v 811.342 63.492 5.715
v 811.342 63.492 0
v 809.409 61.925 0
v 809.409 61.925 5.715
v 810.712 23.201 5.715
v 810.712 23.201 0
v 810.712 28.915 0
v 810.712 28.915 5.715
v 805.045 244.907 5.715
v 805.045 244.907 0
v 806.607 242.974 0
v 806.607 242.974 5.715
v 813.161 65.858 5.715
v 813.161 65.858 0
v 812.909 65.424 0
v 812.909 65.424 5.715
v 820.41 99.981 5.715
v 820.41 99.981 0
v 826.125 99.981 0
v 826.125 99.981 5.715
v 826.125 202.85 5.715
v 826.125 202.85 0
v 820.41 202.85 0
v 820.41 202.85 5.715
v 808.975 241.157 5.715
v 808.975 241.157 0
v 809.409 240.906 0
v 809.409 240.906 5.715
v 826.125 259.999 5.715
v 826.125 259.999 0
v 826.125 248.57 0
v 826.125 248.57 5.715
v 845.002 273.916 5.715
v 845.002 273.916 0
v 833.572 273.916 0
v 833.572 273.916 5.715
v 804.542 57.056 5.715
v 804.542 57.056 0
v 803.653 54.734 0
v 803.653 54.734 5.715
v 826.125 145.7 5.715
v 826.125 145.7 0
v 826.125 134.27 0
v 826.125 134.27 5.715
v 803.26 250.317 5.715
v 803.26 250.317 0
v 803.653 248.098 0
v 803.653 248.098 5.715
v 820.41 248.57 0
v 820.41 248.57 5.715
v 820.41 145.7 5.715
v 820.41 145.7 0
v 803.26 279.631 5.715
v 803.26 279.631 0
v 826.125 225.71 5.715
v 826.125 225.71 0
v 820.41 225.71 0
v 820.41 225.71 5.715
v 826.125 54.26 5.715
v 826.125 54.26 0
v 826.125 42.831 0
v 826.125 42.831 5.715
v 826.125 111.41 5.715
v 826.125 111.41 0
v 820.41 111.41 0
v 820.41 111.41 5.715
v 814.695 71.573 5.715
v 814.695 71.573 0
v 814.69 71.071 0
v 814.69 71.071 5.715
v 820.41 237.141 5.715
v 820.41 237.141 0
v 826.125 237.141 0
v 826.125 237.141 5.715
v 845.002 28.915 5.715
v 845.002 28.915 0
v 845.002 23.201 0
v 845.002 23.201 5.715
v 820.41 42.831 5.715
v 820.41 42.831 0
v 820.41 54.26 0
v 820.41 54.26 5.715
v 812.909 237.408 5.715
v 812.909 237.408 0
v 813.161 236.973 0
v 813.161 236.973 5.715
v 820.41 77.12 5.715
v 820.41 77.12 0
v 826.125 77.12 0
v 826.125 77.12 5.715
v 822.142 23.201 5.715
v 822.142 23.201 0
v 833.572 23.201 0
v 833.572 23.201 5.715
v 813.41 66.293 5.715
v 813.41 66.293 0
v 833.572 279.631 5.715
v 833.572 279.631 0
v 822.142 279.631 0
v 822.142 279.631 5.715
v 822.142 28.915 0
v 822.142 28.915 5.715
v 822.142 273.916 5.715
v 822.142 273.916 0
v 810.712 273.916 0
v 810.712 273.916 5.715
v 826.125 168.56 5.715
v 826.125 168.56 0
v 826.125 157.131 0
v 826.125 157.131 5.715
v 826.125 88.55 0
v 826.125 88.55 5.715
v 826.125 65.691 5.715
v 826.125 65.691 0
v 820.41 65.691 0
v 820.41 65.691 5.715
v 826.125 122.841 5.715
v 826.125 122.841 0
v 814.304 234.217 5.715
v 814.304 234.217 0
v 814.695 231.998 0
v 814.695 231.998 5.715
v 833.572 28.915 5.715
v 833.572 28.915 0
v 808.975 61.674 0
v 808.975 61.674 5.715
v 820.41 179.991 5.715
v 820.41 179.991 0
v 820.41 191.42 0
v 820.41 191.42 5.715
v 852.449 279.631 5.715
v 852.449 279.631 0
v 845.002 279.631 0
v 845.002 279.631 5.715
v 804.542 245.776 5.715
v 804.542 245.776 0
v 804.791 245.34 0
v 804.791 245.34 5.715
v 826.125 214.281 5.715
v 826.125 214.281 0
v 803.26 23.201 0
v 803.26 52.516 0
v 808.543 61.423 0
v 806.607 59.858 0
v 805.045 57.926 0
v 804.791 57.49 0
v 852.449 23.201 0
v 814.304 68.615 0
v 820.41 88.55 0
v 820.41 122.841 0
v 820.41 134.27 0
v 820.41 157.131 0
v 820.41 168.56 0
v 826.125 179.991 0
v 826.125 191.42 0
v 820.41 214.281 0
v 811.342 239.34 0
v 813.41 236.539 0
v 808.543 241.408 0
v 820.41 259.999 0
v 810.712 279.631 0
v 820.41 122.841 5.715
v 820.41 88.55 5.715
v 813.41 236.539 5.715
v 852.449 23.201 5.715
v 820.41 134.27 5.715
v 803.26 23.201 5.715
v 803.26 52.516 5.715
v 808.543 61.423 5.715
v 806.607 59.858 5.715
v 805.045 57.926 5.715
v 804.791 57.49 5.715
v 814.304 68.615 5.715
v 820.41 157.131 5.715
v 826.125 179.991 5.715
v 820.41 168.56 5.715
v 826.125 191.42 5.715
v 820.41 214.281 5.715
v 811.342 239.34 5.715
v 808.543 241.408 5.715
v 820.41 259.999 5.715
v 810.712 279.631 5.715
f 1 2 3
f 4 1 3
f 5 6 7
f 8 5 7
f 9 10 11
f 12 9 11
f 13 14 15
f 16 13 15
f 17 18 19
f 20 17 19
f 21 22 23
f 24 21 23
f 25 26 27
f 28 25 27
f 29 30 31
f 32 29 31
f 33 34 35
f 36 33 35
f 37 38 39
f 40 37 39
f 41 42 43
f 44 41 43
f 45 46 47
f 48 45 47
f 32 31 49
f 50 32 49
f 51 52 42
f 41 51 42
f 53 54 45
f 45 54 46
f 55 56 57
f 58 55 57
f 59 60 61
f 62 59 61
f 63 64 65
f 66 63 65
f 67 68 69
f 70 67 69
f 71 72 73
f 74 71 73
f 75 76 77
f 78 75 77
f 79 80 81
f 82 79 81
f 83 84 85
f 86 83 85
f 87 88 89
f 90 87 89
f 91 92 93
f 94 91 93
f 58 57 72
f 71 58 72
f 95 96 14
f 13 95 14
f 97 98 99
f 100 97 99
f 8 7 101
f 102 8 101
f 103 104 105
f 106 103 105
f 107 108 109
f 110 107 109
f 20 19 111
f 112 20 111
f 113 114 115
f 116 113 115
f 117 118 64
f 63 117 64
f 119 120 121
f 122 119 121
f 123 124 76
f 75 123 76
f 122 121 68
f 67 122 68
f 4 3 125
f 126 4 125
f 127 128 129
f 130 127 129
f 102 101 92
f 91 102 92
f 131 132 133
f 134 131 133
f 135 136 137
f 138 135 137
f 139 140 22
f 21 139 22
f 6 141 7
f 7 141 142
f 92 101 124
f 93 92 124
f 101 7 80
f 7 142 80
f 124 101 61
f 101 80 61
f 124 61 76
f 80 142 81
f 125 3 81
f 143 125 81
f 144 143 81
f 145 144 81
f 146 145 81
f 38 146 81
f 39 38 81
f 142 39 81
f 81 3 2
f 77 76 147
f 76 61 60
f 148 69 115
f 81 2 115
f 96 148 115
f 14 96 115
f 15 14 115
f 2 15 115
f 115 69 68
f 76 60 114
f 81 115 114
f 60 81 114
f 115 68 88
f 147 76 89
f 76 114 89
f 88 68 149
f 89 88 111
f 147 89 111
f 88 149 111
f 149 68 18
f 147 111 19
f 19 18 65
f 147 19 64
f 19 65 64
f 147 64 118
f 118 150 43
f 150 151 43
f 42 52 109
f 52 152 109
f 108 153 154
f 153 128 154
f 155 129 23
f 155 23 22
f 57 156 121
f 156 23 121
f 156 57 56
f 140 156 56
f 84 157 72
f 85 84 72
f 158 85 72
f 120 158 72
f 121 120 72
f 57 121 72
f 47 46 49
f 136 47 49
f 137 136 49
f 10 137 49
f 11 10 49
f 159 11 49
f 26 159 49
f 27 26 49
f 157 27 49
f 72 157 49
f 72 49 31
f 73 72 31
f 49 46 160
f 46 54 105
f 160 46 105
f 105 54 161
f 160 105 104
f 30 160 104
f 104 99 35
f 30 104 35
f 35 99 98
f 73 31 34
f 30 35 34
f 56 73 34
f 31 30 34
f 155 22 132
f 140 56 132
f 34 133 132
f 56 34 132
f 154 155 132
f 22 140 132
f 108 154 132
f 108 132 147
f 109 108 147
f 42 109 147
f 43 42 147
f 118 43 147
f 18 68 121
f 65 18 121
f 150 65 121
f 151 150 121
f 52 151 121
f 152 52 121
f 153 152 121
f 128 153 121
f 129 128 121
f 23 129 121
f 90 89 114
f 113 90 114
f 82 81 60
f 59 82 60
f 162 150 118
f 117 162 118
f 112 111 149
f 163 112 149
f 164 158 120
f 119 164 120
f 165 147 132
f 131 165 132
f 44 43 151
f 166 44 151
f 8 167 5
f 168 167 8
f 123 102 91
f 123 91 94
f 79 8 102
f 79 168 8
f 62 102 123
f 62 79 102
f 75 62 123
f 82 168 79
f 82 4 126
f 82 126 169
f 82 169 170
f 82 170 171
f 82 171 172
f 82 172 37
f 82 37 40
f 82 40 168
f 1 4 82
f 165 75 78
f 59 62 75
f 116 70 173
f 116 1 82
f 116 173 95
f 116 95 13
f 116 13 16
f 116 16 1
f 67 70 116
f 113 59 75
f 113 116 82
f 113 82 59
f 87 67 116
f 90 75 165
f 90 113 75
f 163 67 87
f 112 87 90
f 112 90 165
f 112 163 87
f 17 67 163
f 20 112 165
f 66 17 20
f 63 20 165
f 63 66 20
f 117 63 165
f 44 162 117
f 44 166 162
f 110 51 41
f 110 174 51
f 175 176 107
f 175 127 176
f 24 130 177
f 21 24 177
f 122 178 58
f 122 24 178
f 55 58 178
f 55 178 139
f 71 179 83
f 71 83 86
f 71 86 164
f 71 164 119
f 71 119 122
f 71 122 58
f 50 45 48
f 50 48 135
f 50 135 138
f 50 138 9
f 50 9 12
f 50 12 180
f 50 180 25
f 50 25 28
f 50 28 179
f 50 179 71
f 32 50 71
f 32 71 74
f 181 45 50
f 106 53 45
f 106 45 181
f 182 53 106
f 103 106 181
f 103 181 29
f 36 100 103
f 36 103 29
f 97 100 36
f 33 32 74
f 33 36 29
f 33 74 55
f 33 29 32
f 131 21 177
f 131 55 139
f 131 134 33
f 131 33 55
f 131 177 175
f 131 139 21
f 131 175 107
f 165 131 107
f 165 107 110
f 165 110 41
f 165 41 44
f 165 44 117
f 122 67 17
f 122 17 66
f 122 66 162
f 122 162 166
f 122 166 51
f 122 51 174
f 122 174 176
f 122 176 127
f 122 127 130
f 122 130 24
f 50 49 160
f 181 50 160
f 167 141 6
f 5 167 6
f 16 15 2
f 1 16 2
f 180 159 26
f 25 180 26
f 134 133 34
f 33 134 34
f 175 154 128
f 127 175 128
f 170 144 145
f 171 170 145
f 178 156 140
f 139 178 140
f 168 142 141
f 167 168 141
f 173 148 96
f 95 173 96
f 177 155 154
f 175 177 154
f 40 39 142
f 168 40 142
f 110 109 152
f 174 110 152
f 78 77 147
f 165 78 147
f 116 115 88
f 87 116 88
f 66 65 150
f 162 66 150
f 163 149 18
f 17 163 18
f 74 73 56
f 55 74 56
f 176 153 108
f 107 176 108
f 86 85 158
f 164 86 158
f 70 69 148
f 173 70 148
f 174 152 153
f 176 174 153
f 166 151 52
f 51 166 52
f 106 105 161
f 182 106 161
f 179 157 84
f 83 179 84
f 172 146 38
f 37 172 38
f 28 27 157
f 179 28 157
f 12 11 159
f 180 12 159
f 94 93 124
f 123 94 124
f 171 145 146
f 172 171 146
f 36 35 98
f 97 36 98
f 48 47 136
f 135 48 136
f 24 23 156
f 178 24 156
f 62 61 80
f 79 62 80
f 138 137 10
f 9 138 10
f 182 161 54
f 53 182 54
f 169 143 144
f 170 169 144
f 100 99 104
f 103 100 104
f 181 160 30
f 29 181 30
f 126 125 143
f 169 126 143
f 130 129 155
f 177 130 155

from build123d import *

# Parameters (mm, degrees)
BOSS_EXTRUDE1_DEPTH = 5.715


with BuildPart() as part:
    # Model → Boss-Extrude1 (new body)
    with BuildSketch(Plane.XY):
        Polygon((803.25976, 23.2006394), (810.71212, 23.2006394), (810.71212, 28.91536), (822.14212, 28.91536), (822.14212, 23.2006394), (833.57212, 23.2006394), (833.57212, 28.91536), (845.00212, 28.91536), (845.00212, 23.2006394), (852.4494, 23.2006394), (852.4494, 279.63114), (845.00212, 279.63114), (845.00212, 273.91614), (833.57212, 273.91614), (833.57212, 279.63114), (822.14212, 279.63114), (822.14212, 273.91614), (810.71212, 273.91614), (810.71212, 279.63114), (803.25976, 279.63114), (803.25976, 251.055124), (803.25976, 250.316746), (803.65346, 248.098056), (804.54246, 245.775988), (804.79138, 245.340378), (805.04538, 244.906546), (806.60748, 242.974368), (808.54296, 241.407696), (808.97476, 241.156744), (809.4091, 240.906046), (811.34204, 239.34039), (812.90922, 237.408466), (813.16068, 236.972856), (813.4096, 236.539024), (814.30368, 234.216956), (814.69484, 231.998266), (814.69484, 231.25811), (814.69484, 71.572628), (814.68976, 71.070978), (814.30368, 68.615306), (813.4096, 66.293238), (813.16068, 65.857882), (812.90922, 65.423796), (811.34204, 63.491872), (809.4091, 61.924946), (808.97476, 61.673994), (808.54296, 61.423296), (806.60748, 59.857894), (805.04538, 57.925716), (804.79138, 57.49036), (804.54246, 57.056274), (803.65346, 54.734206), (803.25976, 52.515516), (803.25976, 51.775868), align=None)
        Polygon((820.40984, 254.28448), (820.40984, 259.99948), (826.12484, 259.99948), (826.12484, 248.570496), (820.40984, 248.570496), align=None, mode=Mode.SUBTRACT)
        Polygon((820.40984, 231.424988), (820.40984, 237.141004), (826.12484, 237.141004), (826.12484, 225.710496), (820.40984, 225.710496), align=None, mode=Mode.SUBTRACT)
        Polygon((820.40984, 208.566004), (820.40984, 214.28075), (826.12484, 214.28075), (826.12484, 202.849988), (820.40984, 202.849988), align=None, mode=Mode.SUBTRACT)
        Polygon((820.40984, 185.70575), (820.40984, 191.420496), (826.12484, 191.420496), (826.12484, 179.991004), (820.40984, 179.991004), align=None, mode=Mode.SUBTRACT)
        Polygon((820.40984, 162.845496), (820.40984, 168.560496), (826.12484, 168.560496), (826.12484, 157.13075), (820.40984, 157.13075), align=None, mode=Mode.SUBTRACT)
        Polygon((820.40984, 139.985496), (820.40984, 145.699988), (826.12484, 145.699988), (826.12484, 134.270496), (820.40984, 134.270496), align=None, mode=Mode.SUBTRACT)
        Polygon((820.40984, 117.124988), (820.40984, 122.841004), (826.12484, 122.841004), (826.12484, 111.410496), (820.40984, 111.410496), align=None, mode=Mode.SUBTRACT)
        Polygon((820.40984, 94.266004), (820.40984, 99.98075), (826.12484, 99.98075), (826.12484, 88.549988), (820.40984, 88.549988), align=None, mode=Mode.SUBTRACT)
        Polygon((820.40984, 71.40575), (820.40984, 77.120496), (826.12484, 77.120496), (826.12484, 65.691004), (820.40984, 65.691004), align=None, mode=Mode.SUBTRACT)
        Polygon((820.40984, 48.545496), (820.40984, 54.260496), (826.12484, 54.260496), (826.12484, 42.83075), (820.40984, 42.83075), align=None, mode=Mode.SUBTRACT)
    extrude(amount=BOSS_EXTRUDE1_DEPTH)


solid = part.part
